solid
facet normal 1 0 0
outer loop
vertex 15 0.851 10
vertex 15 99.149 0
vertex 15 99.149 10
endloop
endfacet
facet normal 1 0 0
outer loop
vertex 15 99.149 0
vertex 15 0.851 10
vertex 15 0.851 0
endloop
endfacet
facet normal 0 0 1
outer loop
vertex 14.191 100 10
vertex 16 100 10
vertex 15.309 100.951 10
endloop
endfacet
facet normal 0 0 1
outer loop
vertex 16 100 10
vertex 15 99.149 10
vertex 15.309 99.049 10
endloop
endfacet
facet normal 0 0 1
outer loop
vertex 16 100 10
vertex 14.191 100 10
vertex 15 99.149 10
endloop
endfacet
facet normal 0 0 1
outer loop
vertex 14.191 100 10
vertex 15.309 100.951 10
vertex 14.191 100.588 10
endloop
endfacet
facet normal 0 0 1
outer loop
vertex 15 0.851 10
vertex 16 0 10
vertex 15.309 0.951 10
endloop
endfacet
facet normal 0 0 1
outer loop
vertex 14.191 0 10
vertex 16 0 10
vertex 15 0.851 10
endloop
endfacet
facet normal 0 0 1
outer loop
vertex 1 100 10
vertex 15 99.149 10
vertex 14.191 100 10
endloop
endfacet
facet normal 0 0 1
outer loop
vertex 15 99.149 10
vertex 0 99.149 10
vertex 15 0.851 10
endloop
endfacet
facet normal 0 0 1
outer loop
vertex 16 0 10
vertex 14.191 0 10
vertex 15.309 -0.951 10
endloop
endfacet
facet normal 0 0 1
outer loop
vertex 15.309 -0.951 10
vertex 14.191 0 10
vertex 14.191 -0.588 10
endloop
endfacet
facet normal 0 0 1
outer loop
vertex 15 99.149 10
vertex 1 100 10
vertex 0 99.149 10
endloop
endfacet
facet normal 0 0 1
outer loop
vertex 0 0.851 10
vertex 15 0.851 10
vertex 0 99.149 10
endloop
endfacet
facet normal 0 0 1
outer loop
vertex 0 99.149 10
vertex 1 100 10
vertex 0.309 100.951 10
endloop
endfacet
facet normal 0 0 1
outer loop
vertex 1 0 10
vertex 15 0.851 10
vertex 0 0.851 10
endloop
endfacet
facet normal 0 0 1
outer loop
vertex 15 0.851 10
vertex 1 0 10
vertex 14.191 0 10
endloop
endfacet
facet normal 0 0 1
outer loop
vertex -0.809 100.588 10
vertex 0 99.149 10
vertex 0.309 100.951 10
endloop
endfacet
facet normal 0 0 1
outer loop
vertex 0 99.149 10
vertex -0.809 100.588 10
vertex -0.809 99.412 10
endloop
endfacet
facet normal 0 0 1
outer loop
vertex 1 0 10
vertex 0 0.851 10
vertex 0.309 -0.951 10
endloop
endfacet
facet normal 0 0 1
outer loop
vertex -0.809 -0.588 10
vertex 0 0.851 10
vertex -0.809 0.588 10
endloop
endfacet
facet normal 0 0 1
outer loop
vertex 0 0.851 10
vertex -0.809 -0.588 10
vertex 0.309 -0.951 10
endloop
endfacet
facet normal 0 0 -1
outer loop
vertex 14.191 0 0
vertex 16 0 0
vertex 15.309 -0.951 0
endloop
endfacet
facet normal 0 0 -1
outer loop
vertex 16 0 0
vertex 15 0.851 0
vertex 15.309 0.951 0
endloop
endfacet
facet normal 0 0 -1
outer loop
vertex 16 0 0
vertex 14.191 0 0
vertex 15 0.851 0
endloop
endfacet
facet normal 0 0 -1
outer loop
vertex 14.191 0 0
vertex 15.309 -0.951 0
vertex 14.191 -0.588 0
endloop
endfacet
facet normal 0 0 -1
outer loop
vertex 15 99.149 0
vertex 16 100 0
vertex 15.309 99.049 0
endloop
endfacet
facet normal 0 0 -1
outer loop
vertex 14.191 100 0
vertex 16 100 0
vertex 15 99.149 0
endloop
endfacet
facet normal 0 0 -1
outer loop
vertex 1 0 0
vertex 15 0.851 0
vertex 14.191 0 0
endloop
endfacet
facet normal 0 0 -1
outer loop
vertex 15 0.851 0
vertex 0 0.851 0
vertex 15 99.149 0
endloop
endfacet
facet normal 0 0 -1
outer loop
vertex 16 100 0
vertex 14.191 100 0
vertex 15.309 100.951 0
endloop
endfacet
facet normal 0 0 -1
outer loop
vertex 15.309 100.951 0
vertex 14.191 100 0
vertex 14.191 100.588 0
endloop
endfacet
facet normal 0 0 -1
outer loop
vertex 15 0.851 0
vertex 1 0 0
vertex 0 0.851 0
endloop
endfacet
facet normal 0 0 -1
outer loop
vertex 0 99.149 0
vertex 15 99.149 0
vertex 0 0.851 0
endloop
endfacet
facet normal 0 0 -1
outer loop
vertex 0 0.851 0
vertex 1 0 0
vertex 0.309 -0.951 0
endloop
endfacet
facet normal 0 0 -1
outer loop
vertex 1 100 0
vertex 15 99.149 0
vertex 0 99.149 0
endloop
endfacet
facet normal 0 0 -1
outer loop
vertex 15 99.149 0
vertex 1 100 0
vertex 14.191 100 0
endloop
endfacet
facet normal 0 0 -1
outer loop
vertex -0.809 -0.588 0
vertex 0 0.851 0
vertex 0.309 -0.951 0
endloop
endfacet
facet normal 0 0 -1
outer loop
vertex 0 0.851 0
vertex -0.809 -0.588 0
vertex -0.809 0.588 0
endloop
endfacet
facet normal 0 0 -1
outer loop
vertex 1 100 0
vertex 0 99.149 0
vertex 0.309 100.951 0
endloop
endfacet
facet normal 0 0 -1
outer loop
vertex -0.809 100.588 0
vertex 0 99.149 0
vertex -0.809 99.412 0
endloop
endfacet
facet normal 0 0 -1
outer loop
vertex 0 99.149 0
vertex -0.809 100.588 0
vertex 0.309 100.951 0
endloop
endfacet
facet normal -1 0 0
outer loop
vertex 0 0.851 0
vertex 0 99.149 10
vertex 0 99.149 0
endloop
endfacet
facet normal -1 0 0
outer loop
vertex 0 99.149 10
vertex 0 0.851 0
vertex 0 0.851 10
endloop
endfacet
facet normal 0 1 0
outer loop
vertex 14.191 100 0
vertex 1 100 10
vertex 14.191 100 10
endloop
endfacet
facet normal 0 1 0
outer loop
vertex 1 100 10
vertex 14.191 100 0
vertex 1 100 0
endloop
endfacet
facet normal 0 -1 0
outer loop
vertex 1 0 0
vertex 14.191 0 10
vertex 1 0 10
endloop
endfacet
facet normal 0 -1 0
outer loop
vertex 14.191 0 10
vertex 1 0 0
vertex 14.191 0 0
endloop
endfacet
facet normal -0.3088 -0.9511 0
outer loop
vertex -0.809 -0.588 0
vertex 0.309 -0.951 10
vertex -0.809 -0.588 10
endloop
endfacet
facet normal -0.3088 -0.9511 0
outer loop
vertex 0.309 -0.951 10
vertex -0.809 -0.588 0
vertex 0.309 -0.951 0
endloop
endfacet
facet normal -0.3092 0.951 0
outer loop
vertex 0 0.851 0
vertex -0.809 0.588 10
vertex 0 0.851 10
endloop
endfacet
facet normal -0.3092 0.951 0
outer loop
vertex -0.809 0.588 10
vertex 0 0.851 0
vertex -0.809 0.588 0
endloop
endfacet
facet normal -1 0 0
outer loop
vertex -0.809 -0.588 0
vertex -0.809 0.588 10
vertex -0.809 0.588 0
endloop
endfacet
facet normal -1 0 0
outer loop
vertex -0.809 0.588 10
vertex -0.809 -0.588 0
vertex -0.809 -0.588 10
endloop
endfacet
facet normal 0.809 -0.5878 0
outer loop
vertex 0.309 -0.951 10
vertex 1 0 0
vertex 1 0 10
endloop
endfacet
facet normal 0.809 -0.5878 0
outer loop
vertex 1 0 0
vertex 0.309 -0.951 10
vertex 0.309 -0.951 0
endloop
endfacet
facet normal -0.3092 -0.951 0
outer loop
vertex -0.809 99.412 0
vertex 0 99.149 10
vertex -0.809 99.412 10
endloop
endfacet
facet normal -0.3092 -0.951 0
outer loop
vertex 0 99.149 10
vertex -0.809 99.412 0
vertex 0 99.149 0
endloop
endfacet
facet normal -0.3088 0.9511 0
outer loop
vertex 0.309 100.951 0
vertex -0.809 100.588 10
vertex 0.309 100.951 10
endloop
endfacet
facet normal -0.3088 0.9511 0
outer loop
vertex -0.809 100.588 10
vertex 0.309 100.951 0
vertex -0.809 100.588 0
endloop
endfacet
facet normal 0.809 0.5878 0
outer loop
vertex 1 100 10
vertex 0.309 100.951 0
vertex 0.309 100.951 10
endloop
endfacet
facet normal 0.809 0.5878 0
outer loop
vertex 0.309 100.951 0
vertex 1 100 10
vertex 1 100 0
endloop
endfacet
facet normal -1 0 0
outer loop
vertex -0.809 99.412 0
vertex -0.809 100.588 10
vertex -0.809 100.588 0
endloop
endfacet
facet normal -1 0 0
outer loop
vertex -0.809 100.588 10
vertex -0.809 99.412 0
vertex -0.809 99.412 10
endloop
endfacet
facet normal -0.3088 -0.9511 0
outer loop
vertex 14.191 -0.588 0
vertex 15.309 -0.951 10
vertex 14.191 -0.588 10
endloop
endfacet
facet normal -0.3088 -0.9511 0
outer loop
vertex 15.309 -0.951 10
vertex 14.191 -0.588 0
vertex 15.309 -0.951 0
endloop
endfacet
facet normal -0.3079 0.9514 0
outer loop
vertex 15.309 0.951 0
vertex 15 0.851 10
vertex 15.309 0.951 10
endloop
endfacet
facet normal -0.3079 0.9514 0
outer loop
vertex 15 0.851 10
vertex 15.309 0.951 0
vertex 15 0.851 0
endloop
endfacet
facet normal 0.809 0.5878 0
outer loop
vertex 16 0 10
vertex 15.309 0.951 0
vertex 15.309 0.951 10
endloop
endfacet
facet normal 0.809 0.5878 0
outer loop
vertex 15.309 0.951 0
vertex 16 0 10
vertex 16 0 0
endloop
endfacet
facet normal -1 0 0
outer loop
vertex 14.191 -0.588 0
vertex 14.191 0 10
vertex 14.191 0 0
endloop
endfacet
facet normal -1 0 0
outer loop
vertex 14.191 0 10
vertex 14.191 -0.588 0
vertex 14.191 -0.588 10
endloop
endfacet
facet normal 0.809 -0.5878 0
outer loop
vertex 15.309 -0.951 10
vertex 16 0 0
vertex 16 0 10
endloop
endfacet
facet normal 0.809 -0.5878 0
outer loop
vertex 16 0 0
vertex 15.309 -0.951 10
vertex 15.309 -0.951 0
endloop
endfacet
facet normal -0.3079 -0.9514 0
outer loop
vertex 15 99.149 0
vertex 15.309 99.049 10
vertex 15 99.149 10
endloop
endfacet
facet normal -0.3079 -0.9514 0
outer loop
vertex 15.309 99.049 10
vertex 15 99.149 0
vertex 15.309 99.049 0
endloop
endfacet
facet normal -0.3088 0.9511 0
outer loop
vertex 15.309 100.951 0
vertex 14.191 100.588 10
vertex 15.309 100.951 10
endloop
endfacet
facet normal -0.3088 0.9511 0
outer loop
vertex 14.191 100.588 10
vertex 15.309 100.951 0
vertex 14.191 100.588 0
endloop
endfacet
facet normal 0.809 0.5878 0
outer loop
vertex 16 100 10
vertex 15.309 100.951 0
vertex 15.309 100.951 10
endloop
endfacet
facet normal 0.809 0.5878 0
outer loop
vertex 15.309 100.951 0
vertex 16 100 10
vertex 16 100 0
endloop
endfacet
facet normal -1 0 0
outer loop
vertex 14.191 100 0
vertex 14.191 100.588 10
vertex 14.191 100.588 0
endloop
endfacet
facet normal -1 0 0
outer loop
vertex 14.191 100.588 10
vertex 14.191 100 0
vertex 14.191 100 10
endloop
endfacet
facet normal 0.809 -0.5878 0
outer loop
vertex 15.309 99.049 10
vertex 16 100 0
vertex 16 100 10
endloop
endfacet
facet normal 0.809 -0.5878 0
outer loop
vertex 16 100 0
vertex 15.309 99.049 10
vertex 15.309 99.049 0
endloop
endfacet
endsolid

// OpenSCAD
module linear_guide_rail() {
    rail_body();
    end_chamfers();
    edge_fillets();
    engraved_markings();
}

module rail_body() {
    translate([0, 0, 0])
        cube([15, 100, 10], center = false);
}

module end_chamfers() {
    // Chamfer on both ends of the rail
    translate([0, 0, 0])
        difference() {
            cube([15, 100, 10], center = false);
            translate([-5, -5, 0])
                rotate([0, 45, 0])
                cube([15, 10, 10], center = false);
            translate([-5, 95, 0])
                rotate([0, -45, 0])
                cube([15, 10, 10], center = false);
        }
}

module edge_fillets() {
    // Fillet the edges of the rail
    for (x = [0, 15]) {
        for (y = [0, 100]) {
            translate([x, y, 0])
                cylinder(r = 1, h = 10, center = false);
        }
    }
}

module engraved_markings() {
    // Engrave markings on the top surface
    translate([7.5, 50, 10.1])
        rotate([90, 0, 0])
        text("Guide Rail", size = 3, valign = "center", halign = "center");
}

linear_guide_rail();
